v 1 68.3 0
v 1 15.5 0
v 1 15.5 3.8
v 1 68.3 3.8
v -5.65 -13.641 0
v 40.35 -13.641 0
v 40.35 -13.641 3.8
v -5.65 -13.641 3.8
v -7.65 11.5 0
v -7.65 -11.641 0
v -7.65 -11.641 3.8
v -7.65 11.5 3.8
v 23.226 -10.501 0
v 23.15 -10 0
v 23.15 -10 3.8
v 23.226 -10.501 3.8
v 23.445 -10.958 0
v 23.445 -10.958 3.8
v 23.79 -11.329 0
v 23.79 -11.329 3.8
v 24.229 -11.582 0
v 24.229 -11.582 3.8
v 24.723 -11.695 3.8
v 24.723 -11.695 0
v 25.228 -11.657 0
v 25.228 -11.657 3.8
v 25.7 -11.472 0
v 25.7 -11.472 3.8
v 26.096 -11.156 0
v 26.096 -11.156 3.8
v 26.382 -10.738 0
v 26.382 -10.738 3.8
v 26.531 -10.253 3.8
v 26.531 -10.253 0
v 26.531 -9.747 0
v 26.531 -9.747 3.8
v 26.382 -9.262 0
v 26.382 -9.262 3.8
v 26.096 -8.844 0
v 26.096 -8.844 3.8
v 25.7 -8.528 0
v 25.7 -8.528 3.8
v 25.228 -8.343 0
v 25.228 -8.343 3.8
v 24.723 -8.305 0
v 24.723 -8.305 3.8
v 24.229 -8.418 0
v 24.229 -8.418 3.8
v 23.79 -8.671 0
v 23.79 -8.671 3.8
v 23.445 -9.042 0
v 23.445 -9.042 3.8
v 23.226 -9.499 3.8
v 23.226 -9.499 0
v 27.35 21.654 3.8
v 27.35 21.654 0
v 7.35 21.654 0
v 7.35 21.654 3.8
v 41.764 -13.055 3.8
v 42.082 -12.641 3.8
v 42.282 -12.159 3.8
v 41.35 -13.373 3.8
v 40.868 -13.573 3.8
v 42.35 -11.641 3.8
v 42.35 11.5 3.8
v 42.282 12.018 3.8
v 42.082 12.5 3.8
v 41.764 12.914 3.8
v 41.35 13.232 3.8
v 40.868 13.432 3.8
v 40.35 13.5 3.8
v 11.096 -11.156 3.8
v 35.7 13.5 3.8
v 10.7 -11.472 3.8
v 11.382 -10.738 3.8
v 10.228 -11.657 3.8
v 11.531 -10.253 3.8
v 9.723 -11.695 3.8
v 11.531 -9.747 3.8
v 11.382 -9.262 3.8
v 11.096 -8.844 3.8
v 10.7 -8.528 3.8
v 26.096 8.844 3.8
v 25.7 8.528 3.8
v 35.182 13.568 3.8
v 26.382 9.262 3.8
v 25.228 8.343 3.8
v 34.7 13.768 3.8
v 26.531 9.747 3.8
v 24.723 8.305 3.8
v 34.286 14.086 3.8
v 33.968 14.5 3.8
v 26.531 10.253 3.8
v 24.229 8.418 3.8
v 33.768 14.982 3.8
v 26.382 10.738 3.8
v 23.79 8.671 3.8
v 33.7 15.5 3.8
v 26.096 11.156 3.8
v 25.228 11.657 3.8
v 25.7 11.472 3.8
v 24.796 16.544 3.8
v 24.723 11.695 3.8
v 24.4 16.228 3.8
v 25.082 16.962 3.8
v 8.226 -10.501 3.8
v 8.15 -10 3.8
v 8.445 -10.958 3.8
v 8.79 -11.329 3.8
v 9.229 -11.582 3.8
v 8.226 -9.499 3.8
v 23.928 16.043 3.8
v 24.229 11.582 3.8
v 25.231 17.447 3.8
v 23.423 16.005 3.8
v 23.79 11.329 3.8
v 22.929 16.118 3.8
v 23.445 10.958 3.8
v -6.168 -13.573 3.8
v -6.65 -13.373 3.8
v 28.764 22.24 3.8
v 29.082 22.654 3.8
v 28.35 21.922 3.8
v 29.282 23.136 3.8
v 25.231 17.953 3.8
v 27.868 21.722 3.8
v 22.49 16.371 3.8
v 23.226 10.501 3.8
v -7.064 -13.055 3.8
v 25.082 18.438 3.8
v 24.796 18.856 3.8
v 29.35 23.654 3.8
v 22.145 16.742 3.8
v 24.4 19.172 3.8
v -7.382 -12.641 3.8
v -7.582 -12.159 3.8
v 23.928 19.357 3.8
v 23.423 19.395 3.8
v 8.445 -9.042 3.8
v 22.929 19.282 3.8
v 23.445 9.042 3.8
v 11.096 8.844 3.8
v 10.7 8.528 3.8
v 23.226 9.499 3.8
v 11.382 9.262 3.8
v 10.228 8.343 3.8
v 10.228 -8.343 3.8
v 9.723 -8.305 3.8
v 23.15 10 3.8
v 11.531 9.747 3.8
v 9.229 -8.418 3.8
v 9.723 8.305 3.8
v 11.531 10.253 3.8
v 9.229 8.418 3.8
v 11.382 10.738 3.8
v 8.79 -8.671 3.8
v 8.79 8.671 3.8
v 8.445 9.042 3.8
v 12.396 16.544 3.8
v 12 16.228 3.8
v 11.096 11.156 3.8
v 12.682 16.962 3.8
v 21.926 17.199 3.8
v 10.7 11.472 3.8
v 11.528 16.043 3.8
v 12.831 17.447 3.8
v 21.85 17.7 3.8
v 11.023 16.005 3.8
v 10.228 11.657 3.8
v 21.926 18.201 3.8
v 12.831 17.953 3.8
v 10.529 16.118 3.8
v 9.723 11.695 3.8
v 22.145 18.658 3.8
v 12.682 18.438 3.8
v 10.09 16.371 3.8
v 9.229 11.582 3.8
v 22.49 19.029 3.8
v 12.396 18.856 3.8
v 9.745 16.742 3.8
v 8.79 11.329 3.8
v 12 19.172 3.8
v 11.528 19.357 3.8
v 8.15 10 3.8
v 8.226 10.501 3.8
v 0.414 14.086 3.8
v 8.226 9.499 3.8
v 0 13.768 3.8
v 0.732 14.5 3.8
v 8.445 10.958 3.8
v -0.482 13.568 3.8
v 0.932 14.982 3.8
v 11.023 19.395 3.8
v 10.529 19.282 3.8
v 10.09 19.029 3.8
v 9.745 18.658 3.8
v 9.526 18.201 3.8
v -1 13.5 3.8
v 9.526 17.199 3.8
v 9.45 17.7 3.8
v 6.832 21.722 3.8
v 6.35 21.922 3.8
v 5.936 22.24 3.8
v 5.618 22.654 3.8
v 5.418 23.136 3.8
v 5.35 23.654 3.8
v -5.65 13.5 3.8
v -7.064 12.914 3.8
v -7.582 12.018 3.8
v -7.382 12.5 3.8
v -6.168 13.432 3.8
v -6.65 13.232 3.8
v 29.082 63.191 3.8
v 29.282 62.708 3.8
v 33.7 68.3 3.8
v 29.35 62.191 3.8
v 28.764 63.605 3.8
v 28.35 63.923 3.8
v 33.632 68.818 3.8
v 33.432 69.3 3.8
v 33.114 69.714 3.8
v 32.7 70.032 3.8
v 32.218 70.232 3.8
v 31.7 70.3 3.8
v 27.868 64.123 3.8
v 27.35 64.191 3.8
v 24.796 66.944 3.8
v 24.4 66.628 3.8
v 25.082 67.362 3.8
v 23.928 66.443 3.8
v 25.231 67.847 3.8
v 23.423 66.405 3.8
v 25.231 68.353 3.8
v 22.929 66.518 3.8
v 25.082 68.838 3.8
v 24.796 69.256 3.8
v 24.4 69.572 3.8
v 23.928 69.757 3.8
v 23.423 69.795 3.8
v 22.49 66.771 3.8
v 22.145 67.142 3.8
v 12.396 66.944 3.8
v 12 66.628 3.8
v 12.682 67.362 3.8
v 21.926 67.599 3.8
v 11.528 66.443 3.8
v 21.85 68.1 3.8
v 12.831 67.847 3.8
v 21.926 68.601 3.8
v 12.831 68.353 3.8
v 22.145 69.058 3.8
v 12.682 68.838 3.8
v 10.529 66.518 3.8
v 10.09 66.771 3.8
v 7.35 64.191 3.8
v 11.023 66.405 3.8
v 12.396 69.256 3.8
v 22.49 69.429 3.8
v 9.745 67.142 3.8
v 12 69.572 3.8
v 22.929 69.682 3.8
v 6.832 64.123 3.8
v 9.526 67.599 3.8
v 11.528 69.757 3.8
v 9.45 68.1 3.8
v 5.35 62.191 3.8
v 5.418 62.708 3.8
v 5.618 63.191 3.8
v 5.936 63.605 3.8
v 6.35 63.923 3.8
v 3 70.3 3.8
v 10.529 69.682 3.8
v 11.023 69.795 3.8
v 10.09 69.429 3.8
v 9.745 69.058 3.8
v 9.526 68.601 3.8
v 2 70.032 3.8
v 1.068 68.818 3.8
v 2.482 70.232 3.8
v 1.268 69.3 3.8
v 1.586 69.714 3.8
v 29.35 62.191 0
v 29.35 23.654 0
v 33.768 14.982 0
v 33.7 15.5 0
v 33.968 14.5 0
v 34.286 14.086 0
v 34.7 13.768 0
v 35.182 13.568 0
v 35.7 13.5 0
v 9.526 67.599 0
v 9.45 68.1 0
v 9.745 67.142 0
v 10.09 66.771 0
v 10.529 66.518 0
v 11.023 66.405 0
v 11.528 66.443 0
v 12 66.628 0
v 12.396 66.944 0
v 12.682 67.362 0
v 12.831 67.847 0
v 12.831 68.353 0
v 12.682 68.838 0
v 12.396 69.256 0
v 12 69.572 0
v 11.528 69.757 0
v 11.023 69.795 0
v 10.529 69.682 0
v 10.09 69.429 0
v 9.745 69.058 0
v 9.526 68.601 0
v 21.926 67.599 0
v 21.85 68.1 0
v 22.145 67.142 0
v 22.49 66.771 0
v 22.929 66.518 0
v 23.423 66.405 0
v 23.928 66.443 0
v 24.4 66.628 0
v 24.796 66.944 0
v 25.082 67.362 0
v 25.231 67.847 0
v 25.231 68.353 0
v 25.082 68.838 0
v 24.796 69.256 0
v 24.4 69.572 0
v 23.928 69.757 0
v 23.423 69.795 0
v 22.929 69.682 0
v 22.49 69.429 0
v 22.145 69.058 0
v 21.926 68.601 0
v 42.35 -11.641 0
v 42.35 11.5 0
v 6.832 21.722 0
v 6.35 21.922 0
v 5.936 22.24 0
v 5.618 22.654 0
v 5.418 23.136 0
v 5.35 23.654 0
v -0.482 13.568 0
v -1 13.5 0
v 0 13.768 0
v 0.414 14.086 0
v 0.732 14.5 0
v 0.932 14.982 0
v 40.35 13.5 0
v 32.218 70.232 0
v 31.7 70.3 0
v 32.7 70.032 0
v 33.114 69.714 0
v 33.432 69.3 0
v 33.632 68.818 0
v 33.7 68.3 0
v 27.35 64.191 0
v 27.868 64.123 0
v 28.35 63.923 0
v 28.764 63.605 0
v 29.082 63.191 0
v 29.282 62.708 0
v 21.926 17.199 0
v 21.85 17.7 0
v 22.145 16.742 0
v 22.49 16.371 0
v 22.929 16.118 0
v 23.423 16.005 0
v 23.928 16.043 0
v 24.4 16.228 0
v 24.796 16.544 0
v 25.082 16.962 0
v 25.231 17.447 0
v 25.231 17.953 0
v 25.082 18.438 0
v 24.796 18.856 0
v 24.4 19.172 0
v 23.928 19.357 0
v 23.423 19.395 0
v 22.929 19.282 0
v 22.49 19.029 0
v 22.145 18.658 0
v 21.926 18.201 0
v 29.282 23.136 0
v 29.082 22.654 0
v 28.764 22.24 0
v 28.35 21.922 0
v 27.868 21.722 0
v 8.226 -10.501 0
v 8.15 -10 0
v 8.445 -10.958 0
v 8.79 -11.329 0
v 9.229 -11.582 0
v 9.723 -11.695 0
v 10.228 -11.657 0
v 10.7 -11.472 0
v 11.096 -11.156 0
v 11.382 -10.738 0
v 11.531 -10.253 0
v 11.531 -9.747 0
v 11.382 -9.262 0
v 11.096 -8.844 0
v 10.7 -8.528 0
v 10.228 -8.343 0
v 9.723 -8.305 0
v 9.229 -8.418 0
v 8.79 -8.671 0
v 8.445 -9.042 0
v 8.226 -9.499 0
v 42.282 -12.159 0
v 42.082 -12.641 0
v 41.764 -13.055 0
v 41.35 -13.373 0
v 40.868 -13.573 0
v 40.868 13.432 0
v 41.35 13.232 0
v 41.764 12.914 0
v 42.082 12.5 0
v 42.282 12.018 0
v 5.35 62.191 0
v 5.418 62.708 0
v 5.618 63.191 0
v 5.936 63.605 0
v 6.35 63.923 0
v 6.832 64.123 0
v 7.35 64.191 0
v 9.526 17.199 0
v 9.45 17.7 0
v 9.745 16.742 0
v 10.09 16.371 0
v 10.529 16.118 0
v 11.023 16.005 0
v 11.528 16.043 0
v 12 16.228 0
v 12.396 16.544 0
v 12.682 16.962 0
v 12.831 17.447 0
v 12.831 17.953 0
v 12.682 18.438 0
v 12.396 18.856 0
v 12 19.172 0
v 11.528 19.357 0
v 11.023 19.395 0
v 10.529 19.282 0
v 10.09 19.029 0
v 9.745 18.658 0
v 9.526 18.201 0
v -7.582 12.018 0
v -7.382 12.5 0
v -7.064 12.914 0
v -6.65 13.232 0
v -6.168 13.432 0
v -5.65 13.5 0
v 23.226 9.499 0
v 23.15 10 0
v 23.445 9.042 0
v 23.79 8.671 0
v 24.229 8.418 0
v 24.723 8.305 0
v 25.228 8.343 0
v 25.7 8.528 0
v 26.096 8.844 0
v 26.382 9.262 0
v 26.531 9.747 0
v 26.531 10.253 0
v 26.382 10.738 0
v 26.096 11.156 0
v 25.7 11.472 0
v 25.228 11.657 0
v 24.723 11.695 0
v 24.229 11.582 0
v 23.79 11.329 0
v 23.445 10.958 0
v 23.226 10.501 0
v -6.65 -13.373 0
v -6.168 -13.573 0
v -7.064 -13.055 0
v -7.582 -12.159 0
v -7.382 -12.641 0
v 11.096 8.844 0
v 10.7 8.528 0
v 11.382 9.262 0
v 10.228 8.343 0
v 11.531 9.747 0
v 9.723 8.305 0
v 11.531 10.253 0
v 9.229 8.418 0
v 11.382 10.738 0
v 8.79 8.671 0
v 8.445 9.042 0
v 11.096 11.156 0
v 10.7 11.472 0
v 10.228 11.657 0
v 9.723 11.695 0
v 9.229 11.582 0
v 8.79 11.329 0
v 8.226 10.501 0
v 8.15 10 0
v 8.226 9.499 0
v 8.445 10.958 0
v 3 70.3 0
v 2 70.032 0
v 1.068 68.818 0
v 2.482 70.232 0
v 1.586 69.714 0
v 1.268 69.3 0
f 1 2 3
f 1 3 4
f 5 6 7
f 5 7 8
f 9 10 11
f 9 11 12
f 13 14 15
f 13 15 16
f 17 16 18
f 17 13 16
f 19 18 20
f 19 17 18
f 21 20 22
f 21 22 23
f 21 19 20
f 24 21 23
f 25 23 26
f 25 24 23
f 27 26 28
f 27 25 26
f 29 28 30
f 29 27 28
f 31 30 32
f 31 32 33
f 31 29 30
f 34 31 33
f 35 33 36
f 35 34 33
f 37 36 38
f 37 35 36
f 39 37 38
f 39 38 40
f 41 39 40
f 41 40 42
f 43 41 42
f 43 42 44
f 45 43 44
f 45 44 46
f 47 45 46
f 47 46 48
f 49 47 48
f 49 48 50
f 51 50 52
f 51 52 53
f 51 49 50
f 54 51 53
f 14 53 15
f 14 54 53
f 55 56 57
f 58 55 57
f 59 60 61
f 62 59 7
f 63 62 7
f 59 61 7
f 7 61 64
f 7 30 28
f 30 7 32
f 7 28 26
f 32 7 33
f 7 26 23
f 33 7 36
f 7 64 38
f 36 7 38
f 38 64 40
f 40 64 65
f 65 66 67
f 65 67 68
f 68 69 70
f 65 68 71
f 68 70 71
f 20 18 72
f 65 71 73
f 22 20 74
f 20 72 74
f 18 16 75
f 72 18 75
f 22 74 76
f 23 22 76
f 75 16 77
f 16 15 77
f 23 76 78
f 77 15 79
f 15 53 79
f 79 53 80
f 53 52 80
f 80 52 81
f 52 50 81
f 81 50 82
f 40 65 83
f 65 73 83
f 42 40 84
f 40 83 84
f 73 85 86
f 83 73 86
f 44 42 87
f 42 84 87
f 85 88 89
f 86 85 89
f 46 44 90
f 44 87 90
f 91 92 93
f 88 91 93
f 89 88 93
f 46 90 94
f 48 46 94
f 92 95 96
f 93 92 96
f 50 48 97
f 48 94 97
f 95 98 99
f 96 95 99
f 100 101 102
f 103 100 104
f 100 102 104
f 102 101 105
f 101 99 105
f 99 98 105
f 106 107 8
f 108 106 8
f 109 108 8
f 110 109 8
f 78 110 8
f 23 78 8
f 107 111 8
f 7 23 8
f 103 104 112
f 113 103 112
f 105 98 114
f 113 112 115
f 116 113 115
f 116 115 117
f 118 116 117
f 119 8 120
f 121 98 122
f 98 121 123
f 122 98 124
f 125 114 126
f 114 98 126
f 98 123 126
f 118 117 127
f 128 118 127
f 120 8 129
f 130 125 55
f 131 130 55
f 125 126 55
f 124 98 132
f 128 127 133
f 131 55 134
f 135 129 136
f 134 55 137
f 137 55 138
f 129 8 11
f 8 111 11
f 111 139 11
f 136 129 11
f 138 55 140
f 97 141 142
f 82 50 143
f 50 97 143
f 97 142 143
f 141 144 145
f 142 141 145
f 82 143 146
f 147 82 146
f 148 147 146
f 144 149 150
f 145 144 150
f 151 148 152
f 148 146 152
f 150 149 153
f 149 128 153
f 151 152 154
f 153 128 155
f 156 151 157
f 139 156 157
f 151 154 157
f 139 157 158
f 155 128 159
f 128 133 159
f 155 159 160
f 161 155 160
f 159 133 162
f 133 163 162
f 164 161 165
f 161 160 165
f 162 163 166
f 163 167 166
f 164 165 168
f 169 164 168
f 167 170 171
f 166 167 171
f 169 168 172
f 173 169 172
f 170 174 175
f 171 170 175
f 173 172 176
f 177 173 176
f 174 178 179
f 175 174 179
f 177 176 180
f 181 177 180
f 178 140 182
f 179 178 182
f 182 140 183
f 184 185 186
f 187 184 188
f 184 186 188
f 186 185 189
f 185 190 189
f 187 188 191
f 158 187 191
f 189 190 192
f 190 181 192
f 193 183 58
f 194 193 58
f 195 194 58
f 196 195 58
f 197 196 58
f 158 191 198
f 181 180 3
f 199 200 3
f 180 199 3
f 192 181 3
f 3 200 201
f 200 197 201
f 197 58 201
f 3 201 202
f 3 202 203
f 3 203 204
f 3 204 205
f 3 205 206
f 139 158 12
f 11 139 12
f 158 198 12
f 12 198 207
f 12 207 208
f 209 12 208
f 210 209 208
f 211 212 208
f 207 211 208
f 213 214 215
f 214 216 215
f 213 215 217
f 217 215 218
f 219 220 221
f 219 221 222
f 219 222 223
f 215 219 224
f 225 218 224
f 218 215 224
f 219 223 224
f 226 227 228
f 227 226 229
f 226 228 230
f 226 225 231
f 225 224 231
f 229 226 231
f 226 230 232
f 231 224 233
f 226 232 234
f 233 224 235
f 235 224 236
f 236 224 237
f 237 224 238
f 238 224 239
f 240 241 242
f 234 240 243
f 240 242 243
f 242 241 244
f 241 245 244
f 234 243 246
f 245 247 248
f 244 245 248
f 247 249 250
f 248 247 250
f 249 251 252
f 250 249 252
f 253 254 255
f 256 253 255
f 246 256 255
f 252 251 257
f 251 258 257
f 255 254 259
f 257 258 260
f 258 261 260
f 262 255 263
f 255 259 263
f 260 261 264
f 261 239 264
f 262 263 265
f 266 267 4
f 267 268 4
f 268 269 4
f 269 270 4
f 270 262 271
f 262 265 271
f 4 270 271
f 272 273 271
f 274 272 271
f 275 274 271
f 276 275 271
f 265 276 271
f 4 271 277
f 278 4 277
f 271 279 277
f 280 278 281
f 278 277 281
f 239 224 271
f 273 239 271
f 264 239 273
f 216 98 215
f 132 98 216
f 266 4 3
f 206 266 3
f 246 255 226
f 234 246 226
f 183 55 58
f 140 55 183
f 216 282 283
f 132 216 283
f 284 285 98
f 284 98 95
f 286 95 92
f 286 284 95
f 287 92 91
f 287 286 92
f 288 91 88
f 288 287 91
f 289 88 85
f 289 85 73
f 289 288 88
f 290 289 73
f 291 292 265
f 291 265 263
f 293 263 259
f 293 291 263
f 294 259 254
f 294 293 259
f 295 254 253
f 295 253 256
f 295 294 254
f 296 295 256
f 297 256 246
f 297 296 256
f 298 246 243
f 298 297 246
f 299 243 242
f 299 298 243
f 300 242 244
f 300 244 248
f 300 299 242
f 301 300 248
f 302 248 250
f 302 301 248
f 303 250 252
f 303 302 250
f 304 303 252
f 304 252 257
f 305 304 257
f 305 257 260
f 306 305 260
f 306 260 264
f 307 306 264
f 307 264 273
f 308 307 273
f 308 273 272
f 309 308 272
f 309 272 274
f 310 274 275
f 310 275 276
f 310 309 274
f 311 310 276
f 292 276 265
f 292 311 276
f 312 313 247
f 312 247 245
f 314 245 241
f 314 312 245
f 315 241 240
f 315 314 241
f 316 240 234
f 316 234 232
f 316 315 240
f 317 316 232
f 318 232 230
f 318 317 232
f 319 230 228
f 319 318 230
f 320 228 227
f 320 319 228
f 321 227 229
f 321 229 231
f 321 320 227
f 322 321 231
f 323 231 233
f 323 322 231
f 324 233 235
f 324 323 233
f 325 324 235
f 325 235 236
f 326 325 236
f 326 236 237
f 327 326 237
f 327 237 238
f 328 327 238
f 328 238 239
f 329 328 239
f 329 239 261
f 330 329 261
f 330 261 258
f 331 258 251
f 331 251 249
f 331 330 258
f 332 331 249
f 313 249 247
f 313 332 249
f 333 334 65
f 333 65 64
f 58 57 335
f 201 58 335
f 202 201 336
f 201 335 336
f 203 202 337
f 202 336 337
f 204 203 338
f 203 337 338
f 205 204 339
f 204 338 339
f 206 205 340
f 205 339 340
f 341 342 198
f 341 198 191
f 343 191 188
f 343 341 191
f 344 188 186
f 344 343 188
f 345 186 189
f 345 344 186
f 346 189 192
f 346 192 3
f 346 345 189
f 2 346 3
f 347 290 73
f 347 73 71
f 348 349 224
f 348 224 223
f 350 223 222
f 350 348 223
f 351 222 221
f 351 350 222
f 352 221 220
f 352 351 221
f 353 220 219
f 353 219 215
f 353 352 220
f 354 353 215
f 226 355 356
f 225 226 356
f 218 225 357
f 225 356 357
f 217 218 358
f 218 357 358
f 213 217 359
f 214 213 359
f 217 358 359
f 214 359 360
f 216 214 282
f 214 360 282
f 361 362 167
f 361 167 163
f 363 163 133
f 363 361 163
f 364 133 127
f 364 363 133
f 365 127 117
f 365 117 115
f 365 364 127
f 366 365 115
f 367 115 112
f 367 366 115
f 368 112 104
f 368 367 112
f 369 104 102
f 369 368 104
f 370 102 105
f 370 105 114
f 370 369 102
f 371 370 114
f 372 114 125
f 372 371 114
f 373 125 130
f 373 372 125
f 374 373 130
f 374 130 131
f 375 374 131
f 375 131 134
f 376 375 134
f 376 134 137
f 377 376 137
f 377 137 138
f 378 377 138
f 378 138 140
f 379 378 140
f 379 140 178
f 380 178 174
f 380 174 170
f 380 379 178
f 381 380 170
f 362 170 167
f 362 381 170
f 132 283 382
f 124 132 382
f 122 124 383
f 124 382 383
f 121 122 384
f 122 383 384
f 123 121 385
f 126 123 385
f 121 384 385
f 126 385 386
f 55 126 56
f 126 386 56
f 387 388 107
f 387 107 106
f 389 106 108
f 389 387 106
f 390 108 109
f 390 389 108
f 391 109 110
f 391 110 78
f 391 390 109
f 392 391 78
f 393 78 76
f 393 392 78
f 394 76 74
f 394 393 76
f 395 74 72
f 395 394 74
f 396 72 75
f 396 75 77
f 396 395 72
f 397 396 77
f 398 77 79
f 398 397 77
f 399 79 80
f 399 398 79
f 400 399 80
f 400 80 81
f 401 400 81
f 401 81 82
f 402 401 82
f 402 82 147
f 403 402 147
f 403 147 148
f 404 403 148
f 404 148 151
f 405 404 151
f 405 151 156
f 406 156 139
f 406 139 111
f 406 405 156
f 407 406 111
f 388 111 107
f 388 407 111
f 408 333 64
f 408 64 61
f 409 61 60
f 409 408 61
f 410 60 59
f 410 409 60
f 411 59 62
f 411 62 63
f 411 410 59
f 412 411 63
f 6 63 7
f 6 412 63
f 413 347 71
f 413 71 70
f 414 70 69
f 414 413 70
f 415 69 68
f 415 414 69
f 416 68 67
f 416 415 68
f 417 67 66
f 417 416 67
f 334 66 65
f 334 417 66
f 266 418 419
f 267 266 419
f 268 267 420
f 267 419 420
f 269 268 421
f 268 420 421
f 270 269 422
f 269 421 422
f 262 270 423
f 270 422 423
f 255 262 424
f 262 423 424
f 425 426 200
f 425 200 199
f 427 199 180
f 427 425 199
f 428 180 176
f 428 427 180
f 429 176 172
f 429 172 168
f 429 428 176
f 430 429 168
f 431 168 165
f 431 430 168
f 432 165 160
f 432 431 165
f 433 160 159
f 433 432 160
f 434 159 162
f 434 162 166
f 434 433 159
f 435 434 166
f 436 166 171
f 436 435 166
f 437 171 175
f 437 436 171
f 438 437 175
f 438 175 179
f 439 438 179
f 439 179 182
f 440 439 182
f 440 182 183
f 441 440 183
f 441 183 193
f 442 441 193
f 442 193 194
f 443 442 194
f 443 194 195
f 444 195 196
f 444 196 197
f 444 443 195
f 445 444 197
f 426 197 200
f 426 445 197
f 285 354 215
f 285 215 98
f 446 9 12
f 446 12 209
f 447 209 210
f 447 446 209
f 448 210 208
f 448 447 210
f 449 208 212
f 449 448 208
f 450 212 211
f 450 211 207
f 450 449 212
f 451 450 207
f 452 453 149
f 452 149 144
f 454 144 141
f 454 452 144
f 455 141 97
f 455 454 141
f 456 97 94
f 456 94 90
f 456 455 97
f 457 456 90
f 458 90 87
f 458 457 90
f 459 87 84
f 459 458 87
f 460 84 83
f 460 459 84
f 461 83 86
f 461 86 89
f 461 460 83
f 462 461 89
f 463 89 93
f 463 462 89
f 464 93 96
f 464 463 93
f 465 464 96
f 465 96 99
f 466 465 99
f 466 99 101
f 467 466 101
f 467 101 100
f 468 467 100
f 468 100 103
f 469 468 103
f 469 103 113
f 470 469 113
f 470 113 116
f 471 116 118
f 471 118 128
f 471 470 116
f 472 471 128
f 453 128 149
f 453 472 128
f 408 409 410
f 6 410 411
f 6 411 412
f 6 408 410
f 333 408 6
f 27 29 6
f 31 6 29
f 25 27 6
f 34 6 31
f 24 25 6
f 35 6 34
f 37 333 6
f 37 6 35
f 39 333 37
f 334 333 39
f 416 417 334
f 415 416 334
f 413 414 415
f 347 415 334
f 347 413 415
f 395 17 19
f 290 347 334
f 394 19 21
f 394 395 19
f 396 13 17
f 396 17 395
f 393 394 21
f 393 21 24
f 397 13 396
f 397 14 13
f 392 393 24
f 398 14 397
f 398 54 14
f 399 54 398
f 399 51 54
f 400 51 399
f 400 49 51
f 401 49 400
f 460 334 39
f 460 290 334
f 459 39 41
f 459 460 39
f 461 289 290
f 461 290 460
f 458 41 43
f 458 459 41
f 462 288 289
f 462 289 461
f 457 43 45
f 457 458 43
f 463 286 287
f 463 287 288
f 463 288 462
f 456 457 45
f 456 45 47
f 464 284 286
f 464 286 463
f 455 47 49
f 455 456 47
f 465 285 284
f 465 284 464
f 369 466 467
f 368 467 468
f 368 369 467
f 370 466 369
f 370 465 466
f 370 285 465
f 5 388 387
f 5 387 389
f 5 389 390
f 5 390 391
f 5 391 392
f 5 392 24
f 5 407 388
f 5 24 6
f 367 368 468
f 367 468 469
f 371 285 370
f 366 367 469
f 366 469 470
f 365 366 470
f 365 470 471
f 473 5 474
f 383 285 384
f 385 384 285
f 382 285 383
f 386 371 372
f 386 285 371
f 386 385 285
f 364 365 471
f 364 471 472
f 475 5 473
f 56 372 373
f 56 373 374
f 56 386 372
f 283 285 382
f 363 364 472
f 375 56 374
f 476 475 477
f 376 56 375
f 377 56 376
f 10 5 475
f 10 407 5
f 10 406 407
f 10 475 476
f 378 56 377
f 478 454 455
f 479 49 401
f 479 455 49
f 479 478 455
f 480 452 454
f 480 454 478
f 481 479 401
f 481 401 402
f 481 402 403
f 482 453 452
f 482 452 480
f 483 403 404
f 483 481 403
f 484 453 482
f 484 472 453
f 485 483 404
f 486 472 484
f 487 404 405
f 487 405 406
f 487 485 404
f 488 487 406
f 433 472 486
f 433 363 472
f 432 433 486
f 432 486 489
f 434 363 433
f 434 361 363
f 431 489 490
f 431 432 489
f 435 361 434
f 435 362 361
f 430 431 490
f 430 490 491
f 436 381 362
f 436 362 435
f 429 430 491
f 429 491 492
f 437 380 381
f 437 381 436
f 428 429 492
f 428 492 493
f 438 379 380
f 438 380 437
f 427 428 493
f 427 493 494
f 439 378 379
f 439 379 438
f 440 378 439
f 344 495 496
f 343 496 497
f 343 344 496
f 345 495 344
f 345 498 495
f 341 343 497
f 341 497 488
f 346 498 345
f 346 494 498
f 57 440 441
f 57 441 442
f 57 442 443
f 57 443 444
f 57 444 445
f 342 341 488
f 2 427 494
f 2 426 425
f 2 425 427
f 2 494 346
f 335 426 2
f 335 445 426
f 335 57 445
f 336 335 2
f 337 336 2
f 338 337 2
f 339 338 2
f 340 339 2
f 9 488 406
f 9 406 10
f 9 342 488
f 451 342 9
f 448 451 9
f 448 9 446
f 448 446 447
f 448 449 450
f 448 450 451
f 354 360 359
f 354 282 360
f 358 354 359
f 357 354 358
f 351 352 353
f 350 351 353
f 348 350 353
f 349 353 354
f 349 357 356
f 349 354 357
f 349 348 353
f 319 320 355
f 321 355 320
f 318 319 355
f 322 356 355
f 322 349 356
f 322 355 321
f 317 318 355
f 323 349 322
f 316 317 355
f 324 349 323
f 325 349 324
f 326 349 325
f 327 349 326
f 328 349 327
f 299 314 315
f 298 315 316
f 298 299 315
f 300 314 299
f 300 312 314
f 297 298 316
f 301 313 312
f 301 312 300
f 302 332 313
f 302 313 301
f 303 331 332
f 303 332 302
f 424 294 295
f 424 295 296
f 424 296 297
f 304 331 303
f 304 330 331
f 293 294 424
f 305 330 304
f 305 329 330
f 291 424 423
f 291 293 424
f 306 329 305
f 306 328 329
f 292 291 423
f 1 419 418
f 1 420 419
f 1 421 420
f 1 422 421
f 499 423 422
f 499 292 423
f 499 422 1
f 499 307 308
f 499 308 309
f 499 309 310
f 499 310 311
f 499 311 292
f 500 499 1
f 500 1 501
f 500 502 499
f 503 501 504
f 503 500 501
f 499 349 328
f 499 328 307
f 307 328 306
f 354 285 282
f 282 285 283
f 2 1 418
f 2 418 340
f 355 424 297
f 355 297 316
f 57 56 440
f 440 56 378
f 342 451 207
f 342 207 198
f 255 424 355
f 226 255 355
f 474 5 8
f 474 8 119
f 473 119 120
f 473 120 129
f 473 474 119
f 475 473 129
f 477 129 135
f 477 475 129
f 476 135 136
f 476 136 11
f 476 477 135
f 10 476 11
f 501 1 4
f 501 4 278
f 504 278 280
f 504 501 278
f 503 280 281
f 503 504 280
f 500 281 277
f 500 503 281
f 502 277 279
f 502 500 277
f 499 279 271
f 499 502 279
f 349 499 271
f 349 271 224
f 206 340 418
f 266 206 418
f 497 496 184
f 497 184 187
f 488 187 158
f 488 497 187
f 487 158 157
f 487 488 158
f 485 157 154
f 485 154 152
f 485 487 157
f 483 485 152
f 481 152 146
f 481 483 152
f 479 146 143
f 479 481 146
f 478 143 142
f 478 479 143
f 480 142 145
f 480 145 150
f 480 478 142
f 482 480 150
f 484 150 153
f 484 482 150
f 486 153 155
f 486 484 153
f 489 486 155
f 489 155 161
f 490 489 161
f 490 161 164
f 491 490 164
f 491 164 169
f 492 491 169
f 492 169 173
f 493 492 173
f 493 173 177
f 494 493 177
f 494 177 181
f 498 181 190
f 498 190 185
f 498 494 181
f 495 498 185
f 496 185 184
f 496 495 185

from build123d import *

# Parameters (mm, degrees)
SKETCH1_R           = 1.7
BOSS_EXTRUDE1_DEPTH = 3.8


with BuildPart() as part:
    # Sketch1 → Boss-Extrude1 (new body)
    with BuildSketch(Plane.XY):
        with BuildLine():
            Line((3.000019473, 70.3), (31.700019473, 70.3))
            ThreePointArc((31.700019473, 70.3), (33.114233035, 69.714213562), (33.700019473, 68.3))
            Line((33.700019473, 68.3), (33.700019473, 15.5))
            ThreePointArc((33.700019473, 15.5), (34.285805911, 14.085786438), (35.700019473, 13.5))
            Line((35.700019473, 13.5), (40.350019473, 13.5))
            ThreePointArc((40.350019473, 13.5), (41.764233035, 12.914213562), (42.350019473, 11.5))
            Line((42.350019473, 11.5), (42.350019473, -11.641128199))
            ThreePointArc((42.350019473, -11.641128199), (41.764233035, -13.055341761), (40.350019473, -13.641128199))
            Line((40.350019473, -13.641128199), (31.700019473, -13.641128199))
            Line((31.700019473, -13.641128199), (3.000019473, -13.641128199))
            Line((3.000019473, -13.641128199), (-5.649980527, -13.641128199))
            ThreePointArc((-5.649980527, -13.641128199), (-7.064194089, -13.055341761), (-7.649980527, -11.641128199))
            Line((-7.649980527, -11.641128199), (-7.649980527, 11.5))
            ThreePointArc((-7.649980527, 11.5), (-7.064194089, 12.914213562), (-5.649980527, 13.5))
            Line((-5.649980527, 13.5), (-0.999980527, 13.5))
            ThreePointArc((-0.999980527, 13.5), (0.414233035, 14.085786438), (1.000019473, 15.5))
            Line((1.000019473, 15.5), (1.000019473, 68.3))
            ThreePointArc((1.000019473, 68.3), (1.585805911, 69.714213562), (3.000019473, 70.3))
        make_face()
        with Locations(Location((11.15, 17.7, 0), (0, 0, 180))):
            Circle(SKETCH1_R, mode=Mode.SUBTRACT)
        with Locations(Location((9.85, 10, 0), (0, 0, 180))):
            Circle(SKETCH1_R, mode=Mode.SUBTRACT)
        with Locations(Location((24.85, 10, 0), (0, 0, 180))):
            Circle(SKETCH1_R, mode=Mode.SUBTRACT)
        with Locations(Location((9.85, -10, 0), (0, 0, 180))):
            Circle(SKETCH1_R, mode=Mode.SUBTRACT)
        with Locations(Location((24.85, -10, 0), (0, 0, 180))):
            Circle(SKETCH1_R, mode=Mode.SUBTRACT)
        with Locations(Location((23.55, 17.7, 0), (0, 0, 180))):
            Circle(SKETCH1_R, mode=Mode.SUBTRACT)
        with Locations(Location((23.55, 68.1, 0), (0, 0, 180))):
            Circle(SKETCH1_R, mode=Mode.SUBTRACT)
        with Locations(Location((11.15, 68.1, 0), (0, 0, 180))):
            Circle(SKETCH1_R, mode=Mode.SUBTRACT)
        with BuildLine():
            Line((7.35, 64.190811085), (27.35, 64.190811085))
            ThreePointArc((27.35, 64.190811085), (28.764213562, 63.605024648), (29.35, 62.190811085))
            Line((29.35, 62.190811085), (29.35, 23.654008347))
            ThreePointArc((29.35, 23.654008347), (28.764213562, 22.239794784), (27.35, 21.654008347))
            Line((27.35, 21.654008347), (7.35, 21.654008347))
            ThreePointArc((7.35, 21.654008347), (5.935786438, 22.239794784), (5.35, 23.654008347))
            Line((5.35, 23.654008347), (5.35, 62.190811085))
            ThreePointArc((5.35, 62.190811085), (5.935786438, 63.605024648), (7.35, 64.190811085))
        make_face(mode=Mode.SUBTRACT)
    extrude(amount=BOSS_EXTRUDE1_DEPTH)


solid = part.part
